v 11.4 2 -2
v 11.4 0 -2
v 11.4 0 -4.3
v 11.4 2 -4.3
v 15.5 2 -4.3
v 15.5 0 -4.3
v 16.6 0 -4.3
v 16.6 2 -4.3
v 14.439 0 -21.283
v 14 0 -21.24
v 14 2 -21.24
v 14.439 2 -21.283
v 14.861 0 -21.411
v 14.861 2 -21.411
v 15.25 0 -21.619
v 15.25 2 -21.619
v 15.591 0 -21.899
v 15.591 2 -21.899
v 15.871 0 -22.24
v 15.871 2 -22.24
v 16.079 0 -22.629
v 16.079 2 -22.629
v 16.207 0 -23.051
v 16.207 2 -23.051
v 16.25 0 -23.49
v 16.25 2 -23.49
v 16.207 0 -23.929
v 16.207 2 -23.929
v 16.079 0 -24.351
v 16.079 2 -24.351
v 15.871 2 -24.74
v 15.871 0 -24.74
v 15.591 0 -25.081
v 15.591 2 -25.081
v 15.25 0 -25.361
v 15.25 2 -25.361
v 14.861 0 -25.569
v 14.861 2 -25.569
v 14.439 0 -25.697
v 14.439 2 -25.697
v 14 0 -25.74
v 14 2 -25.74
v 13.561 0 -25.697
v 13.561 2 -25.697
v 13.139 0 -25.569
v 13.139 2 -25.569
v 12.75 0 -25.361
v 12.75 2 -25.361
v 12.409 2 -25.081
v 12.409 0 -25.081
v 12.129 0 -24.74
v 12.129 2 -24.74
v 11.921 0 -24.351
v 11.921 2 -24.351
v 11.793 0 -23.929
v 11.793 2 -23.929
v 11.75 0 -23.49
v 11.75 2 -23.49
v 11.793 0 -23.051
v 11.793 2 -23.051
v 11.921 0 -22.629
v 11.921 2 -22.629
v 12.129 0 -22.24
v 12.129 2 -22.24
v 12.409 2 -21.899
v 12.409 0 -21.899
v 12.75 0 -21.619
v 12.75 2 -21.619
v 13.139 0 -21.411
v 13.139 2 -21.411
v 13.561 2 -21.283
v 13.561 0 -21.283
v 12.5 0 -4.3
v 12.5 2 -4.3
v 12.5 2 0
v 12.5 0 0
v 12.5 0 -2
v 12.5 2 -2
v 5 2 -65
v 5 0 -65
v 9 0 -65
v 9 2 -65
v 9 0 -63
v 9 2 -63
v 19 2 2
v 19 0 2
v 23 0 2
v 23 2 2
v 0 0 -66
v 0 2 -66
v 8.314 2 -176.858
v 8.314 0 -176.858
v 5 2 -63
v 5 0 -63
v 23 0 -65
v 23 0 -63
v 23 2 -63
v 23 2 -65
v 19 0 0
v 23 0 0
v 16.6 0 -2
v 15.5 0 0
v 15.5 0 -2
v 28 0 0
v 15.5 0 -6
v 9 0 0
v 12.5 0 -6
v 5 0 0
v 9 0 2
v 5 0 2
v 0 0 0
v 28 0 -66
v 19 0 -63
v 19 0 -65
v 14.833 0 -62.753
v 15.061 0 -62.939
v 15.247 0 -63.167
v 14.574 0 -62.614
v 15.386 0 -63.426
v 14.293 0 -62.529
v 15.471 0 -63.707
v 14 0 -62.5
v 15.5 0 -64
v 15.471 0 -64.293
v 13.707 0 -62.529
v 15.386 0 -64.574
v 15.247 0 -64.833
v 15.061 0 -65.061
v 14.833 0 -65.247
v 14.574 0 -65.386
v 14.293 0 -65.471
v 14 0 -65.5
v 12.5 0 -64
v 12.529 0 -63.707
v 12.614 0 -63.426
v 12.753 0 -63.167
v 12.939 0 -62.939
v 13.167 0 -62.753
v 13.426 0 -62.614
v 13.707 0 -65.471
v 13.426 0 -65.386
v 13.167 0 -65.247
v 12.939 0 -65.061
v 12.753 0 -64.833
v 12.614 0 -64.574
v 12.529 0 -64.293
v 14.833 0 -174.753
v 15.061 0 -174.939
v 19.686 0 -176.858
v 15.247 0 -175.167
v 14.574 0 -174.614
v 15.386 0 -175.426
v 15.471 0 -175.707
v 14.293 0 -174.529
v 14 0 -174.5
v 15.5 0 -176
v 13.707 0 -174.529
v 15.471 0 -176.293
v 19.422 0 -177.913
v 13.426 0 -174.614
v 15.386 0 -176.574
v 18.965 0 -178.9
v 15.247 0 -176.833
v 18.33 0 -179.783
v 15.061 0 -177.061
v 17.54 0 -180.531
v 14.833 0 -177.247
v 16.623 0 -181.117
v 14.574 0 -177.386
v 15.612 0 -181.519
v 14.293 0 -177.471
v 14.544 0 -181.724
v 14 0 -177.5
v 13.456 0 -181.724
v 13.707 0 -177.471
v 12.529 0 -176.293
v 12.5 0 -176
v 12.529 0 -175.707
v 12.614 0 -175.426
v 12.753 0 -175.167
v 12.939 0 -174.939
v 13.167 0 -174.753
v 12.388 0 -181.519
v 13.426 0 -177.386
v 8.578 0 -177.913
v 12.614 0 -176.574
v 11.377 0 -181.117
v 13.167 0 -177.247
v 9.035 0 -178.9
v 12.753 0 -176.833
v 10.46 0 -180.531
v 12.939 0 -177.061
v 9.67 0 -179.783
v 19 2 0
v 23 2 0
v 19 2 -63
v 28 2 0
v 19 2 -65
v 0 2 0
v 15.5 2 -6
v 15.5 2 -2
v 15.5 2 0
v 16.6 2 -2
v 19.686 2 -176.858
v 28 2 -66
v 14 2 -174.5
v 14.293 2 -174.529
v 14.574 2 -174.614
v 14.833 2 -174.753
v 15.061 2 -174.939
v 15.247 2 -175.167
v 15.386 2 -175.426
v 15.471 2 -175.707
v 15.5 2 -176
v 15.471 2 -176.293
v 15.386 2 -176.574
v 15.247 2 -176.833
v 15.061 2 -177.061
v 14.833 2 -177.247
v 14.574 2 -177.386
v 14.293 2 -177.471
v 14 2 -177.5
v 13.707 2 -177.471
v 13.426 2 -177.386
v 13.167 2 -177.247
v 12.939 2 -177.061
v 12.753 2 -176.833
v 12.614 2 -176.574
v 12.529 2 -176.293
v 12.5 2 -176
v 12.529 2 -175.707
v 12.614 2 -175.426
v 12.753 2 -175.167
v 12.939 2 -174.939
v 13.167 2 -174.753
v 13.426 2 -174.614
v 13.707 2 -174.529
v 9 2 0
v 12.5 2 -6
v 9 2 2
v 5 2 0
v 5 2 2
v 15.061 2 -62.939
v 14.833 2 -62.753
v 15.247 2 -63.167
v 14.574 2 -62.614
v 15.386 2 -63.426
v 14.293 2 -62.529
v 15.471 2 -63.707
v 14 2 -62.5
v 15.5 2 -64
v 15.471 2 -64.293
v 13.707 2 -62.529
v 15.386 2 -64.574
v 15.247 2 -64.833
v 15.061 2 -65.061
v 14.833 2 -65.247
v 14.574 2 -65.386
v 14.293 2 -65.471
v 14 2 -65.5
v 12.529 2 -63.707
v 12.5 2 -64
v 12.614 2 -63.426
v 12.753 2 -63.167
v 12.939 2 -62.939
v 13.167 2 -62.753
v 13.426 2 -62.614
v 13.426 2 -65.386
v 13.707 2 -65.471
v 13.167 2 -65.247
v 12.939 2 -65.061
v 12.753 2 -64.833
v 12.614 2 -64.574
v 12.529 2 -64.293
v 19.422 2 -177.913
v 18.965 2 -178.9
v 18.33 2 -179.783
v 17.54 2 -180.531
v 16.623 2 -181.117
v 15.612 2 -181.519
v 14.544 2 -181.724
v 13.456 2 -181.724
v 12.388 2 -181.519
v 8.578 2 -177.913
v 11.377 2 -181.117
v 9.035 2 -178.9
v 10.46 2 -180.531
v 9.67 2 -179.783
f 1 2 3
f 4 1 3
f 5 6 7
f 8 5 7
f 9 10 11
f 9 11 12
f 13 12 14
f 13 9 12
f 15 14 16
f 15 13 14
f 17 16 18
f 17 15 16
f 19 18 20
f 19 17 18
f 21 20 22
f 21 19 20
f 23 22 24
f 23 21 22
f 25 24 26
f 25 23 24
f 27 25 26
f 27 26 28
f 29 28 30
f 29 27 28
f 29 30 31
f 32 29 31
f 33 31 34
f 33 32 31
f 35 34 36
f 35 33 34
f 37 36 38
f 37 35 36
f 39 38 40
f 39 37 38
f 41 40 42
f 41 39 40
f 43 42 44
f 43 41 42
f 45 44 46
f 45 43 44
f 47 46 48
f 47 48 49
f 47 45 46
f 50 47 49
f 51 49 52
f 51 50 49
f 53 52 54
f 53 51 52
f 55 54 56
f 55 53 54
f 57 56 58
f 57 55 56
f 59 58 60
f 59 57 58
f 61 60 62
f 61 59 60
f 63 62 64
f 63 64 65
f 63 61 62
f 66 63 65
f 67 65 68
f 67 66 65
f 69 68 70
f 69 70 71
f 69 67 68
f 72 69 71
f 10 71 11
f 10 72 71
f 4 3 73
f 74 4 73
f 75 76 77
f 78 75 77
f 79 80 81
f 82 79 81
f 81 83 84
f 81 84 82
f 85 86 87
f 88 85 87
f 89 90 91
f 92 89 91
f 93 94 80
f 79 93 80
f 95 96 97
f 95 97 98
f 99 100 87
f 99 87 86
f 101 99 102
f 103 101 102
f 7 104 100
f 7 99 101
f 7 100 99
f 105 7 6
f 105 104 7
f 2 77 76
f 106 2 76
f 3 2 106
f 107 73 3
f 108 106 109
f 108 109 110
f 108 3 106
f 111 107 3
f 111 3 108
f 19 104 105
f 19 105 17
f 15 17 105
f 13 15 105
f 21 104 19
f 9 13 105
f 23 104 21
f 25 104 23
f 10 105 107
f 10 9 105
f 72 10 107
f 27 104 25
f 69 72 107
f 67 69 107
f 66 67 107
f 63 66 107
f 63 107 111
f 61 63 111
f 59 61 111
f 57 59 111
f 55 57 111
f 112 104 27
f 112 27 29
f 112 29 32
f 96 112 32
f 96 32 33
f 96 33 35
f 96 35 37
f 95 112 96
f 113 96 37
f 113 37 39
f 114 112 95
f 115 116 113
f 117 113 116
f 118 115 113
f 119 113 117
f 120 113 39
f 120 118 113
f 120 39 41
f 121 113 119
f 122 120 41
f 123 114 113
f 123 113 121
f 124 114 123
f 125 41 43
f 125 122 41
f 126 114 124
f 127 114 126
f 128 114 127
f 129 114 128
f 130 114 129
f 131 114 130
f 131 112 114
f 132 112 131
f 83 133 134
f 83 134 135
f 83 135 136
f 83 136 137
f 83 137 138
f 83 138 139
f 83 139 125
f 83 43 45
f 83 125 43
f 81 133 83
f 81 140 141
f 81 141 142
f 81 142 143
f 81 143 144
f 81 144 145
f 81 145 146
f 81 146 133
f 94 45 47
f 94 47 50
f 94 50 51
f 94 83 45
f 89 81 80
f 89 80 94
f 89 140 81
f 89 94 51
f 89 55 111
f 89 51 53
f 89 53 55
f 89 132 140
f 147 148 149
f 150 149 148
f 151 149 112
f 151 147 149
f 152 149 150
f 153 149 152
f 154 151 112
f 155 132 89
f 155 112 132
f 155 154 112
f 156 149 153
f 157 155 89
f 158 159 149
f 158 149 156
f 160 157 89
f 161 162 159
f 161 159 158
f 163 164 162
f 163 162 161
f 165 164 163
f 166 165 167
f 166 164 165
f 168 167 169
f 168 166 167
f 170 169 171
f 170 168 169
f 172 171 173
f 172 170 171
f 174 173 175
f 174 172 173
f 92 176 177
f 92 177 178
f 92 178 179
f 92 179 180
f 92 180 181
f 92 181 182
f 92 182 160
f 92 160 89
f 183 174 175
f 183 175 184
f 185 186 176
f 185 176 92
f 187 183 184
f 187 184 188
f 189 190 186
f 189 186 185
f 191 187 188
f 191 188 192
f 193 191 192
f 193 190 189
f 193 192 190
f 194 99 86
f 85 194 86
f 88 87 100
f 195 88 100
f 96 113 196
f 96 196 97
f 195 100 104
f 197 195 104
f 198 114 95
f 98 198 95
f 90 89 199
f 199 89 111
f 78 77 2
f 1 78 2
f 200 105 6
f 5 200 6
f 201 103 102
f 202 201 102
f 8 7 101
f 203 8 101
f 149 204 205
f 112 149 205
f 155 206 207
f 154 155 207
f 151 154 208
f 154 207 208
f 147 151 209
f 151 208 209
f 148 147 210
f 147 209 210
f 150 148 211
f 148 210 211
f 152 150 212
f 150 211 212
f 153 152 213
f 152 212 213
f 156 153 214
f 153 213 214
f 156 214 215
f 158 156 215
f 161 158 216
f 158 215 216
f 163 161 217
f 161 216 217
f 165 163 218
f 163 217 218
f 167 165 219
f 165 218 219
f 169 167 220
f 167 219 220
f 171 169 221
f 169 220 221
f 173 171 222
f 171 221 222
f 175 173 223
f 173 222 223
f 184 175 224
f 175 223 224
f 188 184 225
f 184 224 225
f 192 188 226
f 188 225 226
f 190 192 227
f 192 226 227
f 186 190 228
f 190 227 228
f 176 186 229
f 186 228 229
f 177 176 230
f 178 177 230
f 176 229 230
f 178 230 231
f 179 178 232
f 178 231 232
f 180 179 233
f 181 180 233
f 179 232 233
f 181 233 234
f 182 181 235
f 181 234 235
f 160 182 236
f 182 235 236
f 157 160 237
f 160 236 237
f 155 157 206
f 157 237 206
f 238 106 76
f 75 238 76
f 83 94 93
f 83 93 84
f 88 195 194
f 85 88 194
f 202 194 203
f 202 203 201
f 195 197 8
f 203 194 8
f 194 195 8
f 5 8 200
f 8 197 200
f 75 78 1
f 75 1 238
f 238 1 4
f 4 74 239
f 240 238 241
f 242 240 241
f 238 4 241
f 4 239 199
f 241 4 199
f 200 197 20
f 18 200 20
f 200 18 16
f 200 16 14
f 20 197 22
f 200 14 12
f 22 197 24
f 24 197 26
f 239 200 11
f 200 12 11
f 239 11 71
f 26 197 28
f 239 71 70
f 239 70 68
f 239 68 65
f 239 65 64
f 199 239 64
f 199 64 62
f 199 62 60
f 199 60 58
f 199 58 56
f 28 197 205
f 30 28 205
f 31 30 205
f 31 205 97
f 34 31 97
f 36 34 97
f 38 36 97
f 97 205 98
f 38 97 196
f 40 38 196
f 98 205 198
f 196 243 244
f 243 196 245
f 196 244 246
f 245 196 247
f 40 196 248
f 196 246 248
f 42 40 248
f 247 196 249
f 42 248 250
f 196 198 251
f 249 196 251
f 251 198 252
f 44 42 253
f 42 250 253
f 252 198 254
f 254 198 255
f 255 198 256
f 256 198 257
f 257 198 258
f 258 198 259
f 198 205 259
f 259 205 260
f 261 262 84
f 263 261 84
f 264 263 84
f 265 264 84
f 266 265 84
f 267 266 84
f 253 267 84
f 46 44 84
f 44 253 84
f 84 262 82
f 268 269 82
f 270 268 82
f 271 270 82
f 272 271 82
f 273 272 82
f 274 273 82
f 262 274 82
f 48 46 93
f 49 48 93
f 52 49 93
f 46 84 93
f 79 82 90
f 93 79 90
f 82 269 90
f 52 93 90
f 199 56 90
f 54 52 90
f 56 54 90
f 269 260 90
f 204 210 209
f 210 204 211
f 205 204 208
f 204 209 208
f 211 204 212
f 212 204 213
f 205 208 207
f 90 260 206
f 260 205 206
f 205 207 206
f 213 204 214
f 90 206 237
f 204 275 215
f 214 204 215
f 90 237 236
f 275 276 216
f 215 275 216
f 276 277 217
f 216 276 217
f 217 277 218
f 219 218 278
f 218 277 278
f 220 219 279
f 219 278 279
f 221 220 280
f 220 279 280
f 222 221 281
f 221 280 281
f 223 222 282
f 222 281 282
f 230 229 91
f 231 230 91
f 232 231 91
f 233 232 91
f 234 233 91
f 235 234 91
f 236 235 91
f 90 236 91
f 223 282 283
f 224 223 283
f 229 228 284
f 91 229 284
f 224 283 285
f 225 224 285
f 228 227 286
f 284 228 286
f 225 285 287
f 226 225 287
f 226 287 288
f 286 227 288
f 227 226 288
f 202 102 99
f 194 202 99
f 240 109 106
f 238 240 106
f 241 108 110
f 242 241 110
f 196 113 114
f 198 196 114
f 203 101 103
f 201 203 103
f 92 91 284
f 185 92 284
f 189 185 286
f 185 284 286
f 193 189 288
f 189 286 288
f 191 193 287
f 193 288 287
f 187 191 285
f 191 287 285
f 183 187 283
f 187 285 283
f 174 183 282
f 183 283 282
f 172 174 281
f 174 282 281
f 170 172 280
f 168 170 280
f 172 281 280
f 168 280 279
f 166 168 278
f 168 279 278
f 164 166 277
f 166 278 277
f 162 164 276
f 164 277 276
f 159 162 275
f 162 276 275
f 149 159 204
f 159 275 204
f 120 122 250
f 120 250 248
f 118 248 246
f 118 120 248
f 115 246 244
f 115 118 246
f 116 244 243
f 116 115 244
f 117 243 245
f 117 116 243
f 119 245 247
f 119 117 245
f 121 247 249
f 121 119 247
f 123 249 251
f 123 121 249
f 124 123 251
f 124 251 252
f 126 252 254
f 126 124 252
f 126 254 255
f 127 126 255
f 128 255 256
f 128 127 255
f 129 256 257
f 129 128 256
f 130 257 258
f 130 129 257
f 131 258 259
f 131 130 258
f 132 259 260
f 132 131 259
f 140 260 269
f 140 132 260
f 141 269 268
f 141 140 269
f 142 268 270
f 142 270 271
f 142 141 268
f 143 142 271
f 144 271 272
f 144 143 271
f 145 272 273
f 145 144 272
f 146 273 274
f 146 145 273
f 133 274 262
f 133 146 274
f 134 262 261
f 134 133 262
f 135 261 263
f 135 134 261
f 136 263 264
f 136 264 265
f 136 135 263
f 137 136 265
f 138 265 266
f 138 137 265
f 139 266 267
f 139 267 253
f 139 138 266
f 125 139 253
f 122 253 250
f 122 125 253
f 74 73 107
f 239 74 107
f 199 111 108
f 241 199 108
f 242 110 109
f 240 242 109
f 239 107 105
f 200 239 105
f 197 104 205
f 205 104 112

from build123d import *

# Parameters (mm, degrees)
SKETCH1_R           = 1.5
SKETCH1_R_2         = 2.25
SKETCH1_W           = 4
SKETCH1_H           = 2
BOSS_EXTRUDE1_DEPTH = 2
BOSS_EXTRUDE2_DEPTH = 2
SKETCH3_R           = 1.5
CUT_EXTRUDE1_DEPTH  = 2


with BuildPart() as part:
    # Sketch1 → Boss-Extrude1 (new body)
    with BuildSketch(Plane(origin=(0, 0, 0), x_dir=(1, 0, 0), z_dir=(0, 1, 0))):
        Polygon((0, 0), (5, 0), (5, -2), (9, -2), (9, 0), (12.5, 0), (12.5, 2), (11.4, 2), (11.4, 4.3), (12.5, 4.3), (12.5, 6), (15.5, 6), (15.5, 4.3), (16.6, 4.3), (16.6, 2), (15.5, 2), (15.5, 0), (19, 0), (19, -2), (23, -2), (23, 0), (28, 0), (28, 66), (0, 66), align=None)
        with Locations(Location((14, 64, 0), (0, 0, 270))):
            Circle(SKETCH1_R, mode=Mode.SUBTRACT)
        with Locations(Location((14, 23.49, 0), (0, 0, 270))):
            Circle(SKETCH1_R_2, mode=Mode.SUBTRACT)
        with Locations((7, 64)):
            Rectangle(SKETCH1_W, SKETCH1_H, mode=Mode.SUBTRACT)
        with Locations((21, 64)):
            Rectangle(SKETCH1_W, SKETCH1_H, mode=Mode.SUBTRACT)
    extrude(amount=BOSS_EXTRUDE1_DEPTH)

    # Sketch2 → Boss-Extrude2 (add)
    with BuildSketch(Plane(origin=(0, 2, 0), x_dir=(1, 0, 0), z_dir=(0, 1, 0))):
        with BuildLine():
            Line((28, 66), (0, 66))
            Line((0, 66), (9, 186))
            ThreePointArc((9, 186), (14, 191), (19, 186))
            Line((19, 186), (28, 66))
        make_face()
    extrude(amount=-BOSS_EXTRUDE2_DEPTH)

    # Sketch3 → Cut-Extrude1 (cut)
    with BuildSketch(Plane(origin=(0, 2, 0), x_dir=(1, 0, 0), z_dir=(0, 1, 0))):
        with Locations(Location((14, 176, 0), (0, 0, 270))):
            Circle(SKETCH3_R)
        with BuildLine():
            Line((19.75, 176), (22.006411719, 176))
            Line((22.006411719, 176), (22.006411719, 202.106155701))
            Line((22.006411719, 202.106155701), (5.130827786, 202.106155701))
            Line((5.130827786, 202.106155701), (5.130827786, 176))
            Line((5.130827786, 176), (8.25, 176))
            ThreePointArc((8.25, 176), (14, 181.75), (19.75, 176))
        make_face()
    extrude(amount=-CUT_EXTRUDE1_DEPTH, mode=Mode.SUBTRACT)


solid = part.part
